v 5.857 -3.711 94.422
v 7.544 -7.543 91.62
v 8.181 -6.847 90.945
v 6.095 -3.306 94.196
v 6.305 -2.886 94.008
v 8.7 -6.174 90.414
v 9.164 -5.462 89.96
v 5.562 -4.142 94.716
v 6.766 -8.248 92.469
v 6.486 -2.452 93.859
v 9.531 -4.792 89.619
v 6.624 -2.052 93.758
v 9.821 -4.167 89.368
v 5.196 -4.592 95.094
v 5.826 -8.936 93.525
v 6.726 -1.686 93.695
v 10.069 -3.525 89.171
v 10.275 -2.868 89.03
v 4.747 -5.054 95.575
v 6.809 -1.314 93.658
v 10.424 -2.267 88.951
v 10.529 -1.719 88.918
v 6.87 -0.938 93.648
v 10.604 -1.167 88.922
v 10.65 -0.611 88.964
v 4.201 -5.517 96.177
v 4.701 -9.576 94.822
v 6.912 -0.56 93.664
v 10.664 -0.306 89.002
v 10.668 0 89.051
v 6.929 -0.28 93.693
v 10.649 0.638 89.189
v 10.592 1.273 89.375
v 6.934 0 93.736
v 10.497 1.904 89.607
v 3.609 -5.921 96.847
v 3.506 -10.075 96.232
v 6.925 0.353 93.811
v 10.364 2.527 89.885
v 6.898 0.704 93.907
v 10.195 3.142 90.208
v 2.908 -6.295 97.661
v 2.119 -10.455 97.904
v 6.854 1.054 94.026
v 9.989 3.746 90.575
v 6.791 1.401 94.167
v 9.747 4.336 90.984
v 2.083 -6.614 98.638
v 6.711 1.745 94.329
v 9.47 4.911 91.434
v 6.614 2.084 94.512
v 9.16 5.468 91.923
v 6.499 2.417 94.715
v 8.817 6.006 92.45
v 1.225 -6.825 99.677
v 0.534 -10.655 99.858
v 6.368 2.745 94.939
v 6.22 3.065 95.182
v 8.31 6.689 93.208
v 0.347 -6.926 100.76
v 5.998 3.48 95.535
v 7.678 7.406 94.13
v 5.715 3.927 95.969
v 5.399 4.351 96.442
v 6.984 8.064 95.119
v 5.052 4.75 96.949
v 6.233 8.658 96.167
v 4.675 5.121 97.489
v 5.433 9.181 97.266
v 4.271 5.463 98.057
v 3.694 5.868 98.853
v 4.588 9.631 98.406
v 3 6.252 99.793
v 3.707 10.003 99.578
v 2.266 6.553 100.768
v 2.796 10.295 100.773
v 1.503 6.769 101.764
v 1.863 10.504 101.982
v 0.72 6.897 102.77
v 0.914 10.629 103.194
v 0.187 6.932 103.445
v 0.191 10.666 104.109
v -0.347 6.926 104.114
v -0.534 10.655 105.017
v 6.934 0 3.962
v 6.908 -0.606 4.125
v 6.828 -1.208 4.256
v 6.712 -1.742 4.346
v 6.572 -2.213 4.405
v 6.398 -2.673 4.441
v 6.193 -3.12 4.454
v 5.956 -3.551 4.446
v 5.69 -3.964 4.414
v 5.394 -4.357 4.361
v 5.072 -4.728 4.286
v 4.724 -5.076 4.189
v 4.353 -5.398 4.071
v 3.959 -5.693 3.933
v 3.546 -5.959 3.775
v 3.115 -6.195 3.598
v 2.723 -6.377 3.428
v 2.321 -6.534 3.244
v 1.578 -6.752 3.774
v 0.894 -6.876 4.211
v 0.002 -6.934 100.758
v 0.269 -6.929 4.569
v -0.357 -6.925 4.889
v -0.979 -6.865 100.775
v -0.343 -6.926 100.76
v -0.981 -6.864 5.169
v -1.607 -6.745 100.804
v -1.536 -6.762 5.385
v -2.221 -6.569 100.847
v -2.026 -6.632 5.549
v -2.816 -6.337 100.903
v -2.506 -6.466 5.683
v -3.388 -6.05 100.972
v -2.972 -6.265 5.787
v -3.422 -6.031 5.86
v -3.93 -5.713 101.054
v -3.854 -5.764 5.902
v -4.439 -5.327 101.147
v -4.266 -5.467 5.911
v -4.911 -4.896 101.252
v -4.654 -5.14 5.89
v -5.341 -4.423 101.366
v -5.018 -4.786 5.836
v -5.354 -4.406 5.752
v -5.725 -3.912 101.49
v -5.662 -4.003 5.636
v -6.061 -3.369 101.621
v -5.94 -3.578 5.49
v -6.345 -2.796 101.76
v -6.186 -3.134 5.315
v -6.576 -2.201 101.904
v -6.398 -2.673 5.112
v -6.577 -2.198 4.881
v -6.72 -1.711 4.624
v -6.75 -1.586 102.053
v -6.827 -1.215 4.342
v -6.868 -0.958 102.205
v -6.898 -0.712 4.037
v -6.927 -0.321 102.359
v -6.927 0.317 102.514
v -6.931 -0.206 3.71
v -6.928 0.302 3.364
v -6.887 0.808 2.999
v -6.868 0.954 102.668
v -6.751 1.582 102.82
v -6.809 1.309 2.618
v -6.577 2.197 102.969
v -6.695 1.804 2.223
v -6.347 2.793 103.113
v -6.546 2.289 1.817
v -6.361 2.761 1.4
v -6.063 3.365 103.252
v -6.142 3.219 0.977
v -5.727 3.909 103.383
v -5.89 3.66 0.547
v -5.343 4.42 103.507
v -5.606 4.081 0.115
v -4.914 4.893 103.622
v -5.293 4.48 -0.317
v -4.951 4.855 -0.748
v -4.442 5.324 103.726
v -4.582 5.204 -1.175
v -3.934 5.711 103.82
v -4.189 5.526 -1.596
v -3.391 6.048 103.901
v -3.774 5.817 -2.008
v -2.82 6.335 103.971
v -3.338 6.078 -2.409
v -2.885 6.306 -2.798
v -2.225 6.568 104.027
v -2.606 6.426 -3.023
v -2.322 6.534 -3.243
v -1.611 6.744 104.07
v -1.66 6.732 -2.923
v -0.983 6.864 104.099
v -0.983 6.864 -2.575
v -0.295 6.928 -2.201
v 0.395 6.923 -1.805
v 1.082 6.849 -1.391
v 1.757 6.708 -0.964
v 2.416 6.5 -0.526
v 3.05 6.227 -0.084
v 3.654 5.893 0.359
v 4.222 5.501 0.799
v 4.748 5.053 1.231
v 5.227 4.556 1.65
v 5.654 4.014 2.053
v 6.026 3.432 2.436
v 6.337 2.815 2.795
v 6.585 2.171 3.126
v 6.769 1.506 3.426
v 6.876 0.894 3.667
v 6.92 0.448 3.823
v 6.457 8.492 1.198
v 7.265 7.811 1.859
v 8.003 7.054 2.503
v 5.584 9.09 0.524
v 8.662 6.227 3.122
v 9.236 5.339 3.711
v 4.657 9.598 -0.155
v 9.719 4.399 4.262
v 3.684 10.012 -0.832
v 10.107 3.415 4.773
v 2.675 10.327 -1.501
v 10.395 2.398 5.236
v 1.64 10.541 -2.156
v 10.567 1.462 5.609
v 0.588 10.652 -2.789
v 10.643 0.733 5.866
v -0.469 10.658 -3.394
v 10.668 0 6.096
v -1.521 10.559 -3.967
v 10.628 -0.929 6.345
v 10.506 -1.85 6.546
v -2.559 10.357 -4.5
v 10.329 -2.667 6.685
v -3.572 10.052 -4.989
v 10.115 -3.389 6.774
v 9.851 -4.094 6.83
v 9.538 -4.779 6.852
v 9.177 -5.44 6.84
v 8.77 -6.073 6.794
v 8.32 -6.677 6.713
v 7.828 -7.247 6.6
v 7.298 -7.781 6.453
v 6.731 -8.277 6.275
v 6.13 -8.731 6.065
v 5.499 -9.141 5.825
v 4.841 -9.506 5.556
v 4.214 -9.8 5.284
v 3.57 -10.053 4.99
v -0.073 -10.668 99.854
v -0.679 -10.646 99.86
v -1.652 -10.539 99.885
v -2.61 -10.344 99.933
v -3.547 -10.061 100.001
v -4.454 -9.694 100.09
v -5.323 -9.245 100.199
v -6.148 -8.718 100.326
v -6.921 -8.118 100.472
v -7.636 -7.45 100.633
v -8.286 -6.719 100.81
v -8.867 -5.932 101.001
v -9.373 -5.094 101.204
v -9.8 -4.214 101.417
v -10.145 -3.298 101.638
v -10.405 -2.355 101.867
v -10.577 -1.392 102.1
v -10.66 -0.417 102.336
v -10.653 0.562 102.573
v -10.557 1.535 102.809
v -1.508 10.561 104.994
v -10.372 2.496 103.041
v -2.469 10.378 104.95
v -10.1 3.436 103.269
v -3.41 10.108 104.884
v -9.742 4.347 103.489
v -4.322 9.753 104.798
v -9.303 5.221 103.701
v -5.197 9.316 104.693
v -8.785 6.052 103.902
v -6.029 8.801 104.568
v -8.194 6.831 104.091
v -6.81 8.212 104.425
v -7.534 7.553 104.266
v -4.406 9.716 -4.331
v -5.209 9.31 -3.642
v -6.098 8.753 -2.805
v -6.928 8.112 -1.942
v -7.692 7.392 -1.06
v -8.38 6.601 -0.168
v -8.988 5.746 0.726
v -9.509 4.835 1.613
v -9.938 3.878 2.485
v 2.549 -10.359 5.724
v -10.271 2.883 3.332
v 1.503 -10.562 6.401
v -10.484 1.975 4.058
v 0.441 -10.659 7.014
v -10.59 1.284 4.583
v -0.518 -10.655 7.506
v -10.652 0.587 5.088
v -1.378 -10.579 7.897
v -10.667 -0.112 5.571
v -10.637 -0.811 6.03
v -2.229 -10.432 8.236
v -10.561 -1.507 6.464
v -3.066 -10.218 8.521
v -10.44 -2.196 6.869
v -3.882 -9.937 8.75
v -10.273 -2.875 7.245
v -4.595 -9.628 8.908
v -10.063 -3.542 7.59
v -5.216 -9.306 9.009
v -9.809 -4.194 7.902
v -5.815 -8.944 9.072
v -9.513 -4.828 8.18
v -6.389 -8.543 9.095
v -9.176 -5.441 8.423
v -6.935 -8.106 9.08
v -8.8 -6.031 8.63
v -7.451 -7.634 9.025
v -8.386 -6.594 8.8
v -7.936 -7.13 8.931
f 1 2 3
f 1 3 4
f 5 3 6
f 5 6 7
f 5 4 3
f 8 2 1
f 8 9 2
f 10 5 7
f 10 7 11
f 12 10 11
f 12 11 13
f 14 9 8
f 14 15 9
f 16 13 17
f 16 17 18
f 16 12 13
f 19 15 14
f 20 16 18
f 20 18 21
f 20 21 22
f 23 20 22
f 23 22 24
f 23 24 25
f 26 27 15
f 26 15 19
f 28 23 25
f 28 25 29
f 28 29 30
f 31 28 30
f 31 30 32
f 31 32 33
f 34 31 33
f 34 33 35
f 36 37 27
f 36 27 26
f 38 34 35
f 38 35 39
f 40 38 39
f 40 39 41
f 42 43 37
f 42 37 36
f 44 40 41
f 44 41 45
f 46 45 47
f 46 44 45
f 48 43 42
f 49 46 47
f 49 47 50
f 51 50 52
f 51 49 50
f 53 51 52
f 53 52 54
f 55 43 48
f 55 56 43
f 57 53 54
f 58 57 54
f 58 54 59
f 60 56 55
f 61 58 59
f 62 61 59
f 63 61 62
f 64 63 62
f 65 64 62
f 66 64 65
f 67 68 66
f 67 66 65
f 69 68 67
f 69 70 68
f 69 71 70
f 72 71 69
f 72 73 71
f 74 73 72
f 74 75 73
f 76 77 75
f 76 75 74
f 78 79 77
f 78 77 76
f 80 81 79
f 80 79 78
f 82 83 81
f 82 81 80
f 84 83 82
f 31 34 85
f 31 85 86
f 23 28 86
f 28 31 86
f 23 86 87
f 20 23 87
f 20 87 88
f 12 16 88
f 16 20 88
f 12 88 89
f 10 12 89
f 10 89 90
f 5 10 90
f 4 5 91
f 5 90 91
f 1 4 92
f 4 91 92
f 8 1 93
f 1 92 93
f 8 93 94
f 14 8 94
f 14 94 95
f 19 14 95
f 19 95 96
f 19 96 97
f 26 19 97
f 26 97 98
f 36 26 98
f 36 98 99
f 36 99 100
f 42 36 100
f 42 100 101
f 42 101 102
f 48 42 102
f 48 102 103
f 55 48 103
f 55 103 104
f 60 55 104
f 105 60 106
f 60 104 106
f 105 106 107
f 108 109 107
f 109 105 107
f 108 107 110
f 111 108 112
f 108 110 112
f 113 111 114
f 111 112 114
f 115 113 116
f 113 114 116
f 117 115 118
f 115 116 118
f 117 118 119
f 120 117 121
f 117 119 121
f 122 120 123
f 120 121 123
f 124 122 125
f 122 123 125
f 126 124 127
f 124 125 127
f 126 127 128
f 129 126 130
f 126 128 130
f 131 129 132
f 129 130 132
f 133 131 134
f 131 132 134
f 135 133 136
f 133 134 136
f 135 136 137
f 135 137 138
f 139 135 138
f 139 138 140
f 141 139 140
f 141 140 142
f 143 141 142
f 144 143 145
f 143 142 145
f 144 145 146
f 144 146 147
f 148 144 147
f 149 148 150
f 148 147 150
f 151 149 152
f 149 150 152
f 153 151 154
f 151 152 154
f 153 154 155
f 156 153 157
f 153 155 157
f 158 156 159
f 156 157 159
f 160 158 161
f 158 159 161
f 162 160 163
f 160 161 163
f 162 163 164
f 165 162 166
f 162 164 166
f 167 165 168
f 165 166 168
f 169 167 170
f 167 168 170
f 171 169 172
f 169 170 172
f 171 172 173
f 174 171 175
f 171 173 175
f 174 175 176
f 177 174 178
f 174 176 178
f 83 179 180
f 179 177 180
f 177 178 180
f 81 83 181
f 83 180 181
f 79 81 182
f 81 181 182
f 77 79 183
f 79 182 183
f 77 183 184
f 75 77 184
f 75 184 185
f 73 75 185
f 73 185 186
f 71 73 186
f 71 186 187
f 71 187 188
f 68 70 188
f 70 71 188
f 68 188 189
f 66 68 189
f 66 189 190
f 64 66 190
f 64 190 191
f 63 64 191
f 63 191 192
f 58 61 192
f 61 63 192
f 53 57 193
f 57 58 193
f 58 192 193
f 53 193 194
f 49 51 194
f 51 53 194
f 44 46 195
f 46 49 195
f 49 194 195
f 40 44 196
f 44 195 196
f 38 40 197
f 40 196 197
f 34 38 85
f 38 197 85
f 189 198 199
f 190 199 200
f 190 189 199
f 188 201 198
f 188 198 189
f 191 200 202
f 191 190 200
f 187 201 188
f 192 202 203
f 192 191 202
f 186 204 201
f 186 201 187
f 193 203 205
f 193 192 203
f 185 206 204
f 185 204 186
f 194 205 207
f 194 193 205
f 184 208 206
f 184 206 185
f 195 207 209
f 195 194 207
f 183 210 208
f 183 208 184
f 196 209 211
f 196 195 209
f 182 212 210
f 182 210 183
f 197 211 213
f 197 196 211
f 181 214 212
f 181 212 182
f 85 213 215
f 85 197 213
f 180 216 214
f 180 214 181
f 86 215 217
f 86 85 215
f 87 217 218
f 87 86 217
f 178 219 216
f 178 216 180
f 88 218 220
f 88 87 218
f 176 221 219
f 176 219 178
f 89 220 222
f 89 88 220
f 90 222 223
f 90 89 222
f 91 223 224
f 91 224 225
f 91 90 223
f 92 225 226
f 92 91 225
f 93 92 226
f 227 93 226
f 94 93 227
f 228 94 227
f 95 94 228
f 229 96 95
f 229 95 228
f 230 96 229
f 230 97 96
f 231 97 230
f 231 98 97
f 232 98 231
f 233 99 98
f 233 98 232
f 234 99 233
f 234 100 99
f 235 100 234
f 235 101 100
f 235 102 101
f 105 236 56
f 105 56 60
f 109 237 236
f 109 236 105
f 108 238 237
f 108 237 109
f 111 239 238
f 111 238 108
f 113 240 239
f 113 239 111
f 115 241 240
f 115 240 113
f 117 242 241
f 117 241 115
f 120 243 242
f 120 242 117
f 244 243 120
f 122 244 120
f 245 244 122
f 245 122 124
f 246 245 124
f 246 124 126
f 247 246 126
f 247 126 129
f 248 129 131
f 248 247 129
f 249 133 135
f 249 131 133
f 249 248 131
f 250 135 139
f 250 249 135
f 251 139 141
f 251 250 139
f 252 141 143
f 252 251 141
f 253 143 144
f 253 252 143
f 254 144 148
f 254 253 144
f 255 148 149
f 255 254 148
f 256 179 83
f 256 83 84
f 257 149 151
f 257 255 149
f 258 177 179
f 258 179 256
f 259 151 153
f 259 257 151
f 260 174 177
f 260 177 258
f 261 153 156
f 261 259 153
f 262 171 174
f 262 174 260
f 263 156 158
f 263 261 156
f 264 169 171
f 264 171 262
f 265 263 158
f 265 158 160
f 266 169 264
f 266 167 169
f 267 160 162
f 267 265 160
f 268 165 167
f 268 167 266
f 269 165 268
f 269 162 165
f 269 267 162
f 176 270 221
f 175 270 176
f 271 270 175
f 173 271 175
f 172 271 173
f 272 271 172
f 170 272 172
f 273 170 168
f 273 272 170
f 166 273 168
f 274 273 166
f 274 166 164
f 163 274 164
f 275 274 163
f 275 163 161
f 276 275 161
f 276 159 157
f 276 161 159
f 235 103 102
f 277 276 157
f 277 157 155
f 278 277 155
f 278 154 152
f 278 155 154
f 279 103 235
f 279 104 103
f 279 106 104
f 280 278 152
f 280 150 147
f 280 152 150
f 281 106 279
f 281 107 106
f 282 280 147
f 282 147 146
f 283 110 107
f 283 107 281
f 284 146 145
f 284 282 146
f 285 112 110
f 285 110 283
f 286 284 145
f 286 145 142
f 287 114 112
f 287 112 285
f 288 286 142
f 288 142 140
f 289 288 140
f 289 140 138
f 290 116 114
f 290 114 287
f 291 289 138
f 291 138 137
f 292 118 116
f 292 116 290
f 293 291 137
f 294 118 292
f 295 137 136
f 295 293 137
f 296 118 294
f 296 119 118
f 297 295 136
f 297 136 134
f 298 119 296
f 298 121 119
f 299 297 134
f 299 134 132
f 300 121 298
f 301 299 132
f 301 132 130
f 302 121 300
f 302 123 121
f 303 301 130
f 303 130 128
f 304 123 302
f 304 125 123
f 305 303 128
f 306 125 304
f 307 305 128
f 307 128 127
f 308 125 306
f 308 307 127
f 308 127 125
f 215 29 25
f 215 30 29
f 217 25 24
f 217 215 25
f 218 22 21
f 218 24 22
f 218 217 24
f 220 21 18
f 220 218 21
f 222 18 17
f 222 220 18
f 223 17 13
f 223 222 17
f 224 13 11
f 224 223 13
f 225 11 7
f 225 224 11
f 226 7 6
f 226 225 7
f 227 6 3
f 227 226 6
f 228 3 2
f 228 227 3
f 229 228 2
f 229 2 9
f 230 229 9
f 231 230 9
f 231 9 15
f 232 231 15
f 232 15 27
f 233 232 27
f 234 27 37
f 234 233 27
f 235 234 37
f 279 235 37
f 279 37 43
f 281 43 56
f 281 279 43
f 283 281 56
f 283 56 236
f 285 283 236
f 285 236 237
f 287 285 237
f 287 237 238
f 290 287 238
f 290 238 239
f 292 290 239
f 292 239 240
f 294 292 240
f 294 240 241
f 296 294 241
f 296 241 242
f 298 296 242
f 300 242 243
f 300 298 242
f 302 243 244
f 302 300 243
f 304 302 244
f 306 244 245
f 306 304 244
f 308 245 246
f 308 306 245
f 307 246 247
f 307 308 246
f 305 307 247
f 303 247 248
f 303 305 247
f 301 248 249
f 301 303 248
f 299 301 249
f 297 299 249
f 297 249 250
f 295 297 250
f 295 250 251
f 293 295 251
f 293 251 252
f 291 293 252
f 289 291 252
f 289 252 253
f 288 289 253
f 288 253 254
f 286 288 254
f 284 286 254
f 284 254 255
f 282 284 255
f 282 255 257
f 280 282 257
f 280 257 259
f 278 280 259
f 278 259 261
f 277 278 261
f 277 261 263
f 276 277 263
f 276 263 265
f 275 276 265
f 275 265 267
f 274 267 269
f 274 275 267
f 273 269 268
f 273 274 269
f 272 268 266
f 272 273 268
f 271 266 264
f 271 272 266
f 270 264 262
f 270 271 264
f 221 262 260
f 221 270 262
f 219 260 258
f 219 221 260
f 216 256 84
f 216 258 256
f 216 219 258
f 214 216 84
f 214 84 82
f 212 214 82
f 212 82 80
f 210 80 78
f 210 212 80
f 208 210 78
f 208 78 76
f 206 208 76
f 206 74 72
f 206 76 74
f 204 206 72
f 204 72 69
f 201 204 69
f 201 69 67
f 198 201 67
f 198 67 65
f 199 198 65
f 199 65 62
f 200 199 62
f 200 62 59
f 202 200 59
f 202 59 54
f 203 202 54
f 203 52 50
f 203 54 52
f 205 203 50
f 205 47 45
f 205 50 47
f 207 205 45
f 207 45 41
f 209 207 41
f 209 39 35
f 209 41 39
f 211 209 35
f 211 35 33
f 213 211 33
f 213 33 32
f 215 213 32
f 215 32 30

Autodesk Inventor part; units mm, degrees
ref_plane "Start Plane" through (0, 0, -4.9897) normal (0, 0, 1) x (1, 0, 0)
ref_plane "End Plane" through (0, 0, 105.0166) normal (0, 0, 1) x (1, 0, 0)
sketch "Sketch" plane through (0, 0, 0) normal (0, 0, 1) x (1, 0, 0)
  circle A0 centre (0, 0) radius 6.9342
  circle A1 centre (0, 0) radius 10.668
  dimension "d0" = 21.336
  dimension "d1" = 3.7338
extrude "Body" add sketch "Sketch" along normal up to surface (110.0063 mm away) from surface at -4.9897
sketch "Sketch3" plane through (0, 0, 0) normal (0, 0, 1) x (1, 0, 0)
  line L0 (0, 0) -> (10, 0)
ref_plane "Work Plane3" through (0, 0, 0) normal (0, -1, 0) x (1, 0, 0)
sketch "Sketch4" plane through (0, 0, 0) normal (0, -1, 0) x (1, 0, 0)
  line L0 (-2, -4.9897) -> (12, -4.9897)
  line L1 (-2, 105.0166) -> (12, 105.0166)
  dimension "d7" = 110.0063
ref_plane "Work Plane4" through (-9.4897, 4.8737, -6.8509) normal (0.4807, -0.2469, -0.8414) x (-0.4571, 0.7483, -0.4807)
split "Split1" plane through (-9.4897, 4.8737, -6.8509) removes the side toward (0.4807, -0.2469, -0.8414)
ref_plane "Work Plane5" through (6.4449, 8.5011, -9.0952) normal (-0.392, -0.517, -0.761) x (0.3573, -0.8478, 0.392)
split "Split2" plane through (6.4449, 8.5011, -9.0952) removes the side toward (-0.392, -0.517, -0.761)
ref_plane "Work Plane6" through (-10.5607, 1.5089, 115.9586) normal (0.7772, -0.111, 0.6194) x (0.627, 0.0533, -0.7772)
split "Split3" plane through (-10.5607, 1.5089, 115.9586) removes the side toward (0.7772, -0.111, 0.6194)
ref_plane "Work Plane7" through (0, 10.668, 105.0198) normal (0, -0.2353, 0.9719) x (1, 0, 0)
split "Split4" plane through (0, 10.668, 105.0198) removes the side toward (0, -0.2353, 0.9719)
equation "\"d0\" = G_H"
equation "\"d1\" = G_T"
equation "\"d2\" = G_L"
equation "\"G_H\" = 21.336"
equation "\"G_T\" = 3.7338"
equation "\"G_L\" = 110.00626"
equation "\"G_OFFSET_START\" = 4.98966"
equation "\"G_OFFSET_END\" = 2.57893"
equation "\"d4\" = -G_OFFSET_START"
equation "\"d5\" = G_OFFSET_END + B_L"
equation "\"B_L\" = 102.43767"
properties part number "ANSI - 1/2 x 0.147 - 4.331" material "Steel, Mild"
